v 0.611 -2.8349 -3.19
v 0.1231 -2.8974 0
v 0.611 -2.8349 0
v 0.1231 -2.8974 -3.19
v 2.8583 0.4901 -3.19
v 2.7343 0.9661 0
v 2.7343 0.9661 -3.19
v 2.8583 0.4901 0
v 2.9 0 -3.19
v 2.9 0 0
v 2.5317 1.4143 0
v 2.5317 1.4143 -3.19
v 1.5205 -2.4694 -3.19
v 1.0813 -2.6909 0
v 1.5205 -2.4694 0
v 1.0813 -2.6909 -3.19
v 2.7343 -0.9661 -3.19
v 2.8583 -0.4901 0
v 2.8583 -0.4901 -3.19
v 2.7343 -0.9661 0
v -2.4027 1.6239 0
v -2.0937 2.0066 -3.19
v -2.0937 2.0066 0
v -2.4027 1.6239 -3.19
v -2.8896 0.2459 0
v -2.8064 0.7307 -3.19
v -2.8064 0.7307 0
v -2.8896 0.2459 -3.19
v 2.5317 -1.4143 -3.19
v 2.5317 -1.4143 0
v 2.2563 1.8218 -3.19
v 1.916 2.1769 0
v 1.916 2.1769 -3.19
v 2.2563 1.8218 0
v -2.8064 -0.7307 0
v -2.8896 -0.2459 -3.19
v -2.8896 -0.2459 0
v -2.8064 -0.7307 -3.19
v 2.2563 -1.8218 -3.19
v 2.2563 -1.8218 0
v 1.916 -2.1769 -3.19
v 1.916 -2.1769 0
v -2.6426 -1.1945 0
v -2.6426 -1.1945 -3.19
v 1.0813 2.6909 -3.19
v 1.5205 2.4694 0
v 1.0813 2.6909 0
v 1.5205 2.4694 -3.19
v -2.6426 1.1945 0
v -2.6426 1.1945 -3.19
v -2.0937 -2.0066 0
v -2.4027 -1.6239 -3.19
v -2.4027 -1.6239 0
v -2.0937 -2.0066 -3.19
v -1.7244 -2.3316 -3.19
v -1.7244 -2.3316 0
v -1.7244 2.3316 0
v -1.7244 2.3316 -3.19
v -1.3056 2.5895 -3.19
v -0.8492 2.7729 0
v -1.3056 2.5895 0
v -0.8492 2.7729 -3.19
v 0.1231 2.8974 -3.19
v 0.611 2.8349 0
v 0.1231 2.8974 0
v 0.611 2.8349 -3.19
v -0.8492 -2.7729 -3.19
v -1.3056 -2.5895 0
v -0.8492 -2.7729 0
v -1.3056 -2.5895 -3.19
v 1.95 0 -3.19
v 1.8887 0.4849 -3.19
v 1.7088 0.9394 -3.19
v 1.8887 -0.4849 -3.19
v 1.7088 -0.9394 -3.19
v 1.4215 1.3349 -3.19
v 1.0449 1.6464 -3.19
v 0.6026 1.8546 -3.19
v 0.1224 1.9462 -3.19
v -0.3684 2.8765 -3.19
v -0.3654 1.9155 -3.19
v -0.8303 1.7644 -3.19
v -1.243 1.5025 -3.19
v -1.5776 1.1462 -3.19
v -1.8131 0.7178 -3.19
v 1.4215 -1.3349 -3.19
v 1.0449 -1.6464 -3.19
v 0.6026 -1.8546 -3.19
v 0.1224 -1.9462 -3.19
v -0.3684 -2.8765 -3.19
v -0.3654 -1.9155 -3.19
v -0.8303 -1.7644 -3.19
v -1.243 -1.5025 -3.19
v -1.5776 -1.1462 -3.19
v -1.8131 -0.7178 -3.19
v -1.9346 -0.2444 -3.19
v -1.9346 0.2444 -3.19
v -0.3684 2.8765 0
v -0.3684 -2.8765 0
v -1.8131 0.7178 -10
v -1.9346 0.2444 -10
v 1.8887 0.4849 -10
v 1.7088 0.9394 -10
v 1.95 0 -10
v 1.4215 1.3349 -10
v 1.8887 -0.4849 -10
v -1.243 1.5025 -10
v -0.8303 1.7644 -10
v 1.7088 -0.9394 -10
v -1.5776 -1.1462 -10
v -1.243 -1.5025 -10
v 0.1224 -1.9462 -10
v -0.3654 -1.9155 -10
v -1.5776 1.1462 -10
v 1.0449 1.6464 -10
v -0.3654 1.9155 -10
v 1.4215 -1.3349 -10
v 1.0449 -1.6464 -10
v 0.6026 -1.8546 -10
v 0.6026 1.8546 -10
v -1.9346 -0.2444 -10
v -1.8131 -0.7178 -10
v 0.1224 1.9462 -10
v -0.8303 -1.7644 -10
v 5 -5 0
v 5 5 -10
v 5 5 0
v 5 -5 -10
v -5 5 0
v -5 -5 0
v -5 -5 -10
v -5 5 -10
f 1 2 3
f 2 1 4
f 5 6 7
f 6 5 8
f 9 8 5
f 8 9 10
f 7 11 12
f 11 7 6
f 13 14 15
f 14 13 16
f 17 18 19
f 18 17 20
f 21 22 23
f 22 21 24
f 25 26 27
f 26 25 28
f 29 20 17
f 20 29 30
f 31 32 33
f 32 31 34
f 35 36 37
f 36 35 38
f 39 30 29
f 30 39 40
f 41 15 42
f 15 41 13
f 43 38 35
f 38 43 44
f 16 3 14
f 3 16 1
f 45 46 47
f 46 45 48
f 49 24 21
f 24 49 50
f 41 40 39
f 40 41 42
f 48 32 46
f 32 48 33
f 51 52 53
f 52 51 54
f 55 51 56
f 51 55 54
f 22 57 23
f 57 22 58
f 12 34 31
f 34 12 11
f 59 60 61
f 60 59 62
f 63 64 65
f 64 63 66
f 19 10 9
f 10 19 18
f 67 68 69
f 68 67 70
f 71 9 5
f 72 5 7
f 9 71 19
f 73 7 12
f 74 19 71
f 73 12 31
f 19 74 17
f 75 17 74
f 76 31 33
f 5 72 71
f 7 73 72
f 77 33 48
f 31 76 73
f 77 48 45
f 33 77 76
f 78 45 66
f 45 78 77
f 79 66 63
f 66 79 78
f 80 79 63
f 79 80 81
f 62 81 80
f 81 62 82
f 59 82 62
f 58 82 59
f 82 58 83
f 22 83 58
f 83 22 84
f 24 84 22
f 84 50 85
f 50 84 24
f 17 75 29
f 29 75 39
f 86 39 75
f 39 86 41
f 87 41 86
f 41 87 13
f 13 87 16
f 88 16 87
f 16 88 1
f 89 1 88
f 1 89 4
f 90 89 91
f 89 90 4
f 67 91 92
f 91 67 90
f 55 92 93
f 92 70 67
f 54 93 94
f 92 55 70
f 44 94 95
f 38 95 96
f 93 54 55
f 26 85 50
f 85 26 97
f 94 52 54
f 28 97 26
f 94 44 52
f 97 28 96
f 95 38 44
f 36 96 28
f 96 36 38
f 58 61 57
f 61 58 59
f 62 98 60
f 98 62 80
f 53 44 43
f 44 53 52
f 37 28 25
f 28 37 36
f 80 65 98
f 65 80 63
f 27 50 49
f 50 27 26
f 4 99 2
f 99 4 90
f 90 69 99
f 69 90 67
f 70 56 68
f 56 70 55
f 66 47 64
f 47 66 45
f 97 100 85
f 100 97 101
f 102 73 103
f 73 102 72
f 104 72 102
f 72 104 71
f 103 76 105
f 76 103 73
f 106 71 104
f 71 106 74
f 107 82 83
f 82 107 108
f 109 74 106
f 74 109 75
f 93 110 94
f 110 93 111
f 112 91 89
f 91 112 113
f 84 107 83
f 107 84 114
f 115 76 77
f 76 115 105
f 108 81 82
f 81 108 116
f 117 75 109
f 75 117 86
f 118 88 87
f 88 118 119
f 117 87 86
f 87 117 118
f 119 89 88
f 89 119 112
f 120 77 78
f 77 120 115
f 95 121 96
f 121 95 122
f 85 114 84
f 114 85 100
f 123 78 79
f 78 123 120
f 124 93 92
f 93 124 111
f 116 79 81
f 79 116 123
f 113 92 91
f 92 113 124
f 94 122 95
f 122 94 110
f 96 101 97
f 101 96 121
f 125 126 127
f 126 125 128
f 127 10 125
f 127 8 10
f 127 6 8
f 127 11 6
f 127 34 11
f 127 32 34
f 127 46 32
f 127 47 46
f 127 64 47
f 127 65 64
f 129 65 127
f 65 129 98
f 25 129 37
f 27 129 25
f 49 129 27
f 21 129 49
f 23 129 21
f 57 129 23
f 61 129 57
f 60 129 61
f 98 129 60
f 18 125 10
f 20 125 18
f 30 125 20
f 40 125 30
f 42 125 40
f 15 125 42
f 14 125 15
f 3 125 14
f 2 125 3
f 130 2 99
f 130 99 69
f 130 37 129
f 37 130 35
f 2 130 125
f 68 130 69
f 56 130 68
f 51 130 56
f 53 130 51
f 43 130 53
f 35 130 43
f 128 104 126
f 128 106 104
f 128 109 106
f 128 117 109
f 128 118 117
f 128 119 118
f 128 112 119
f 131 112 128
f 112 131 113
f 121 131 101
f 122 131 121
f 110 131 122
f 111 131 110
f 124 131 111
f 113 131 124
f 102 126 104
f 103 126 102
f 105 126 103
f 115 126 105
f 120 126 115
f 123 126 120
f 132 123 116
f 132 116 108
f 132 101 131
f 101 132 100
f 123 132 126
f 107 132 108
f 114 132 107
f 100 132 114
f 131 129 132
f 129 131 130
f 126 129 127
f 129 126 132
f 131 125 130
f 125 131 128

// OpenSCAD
// file: ../Polygon.scad
//============================================================
// OpenSCAD
// Regular Convex Polygon Library
// Last Modified : 2015/10/28
//============================================================
/*

	Definition

	N = Number of Side N >=3
	A = apothem
		radius of inside circle
	R = circumradius
		Radius of outside circle
	S = Side
		Lenght of a side

	Build polygon with the Apothem :
	N and A is known
	Need to calculate S then R
	use $fn

	Build Polygon with Circumradius
	N and R known
	use $fn

	Build Polygon with Side
	N and S Known
	Need to calculate R and optionaly A
	use $fn	

	TO DO
    Control result

	For more information :
	http://en.wikipedia.org/wiki/Regular_polygon

*/

//------------------------------------------------------------
//
//------------------------------------------------------------
Demo();

//------------------------------------------------------------
// Demo
//------------------------------------------------------------
module Demo()
{
	inch = 25.4;	// 25.4mm
	// A = apothem - it's a RADIUS !
	// For a bolt of 4 inches spécify A=2*inch
	//Polygon(N=7,A=2*inch,h=0);	// 4 inches radius Polygon
	//Polygon(N=7,A=49.8365,h=0);
	//Trigon(A=50,h=10);			// N=3
	//Dodecagon(A=50,h=0);			// N=12

    //rotate([0,0,360/7/2])
	//Nonagon(R=55.3144,h=10,debug=true);

	//Polygon(N=6,A=60,h=0,debug=false);
	//Polygon(N=6,A=60,h=5,debug=true);

    Enneagon(A=50);
}


//------------------------------------------------------------
// Polygon : 
//------------------------------------------------------------
module Polygon(N=3,A=0,R=0,S=0,h=0,debug=false)
{
	N = ( N < 3 ? 3 : N );

	angle = 360/N;
	angleA = angle/2;

	if (debug)
	{
		echo("N = ", N);
		echo("A = ", A);
		echo("S = ", S);
		echo("R = ", R);
	}

	if ( A > 0 )		// if A assign R and S
	{
        S = 2 * A * tan(angleA);							// assign
		//R = (S/2) / sin(angleA);						// no assign ???
		R = ( A * tan(angleA) ) / sin(angleA);		// asign
		_Build_Polygon(N=N,R=R,h=h);
		if (debug)
		{
			echo("aN = ", N);
			echo("aA = ", A);
			echo("aS = ", S);
			echo("aR = ", R);
			#cylinder(r=A,h=h+1,center=true,$fn=150);
			%cylinder(r=R,h=h+1,center=true,$fn=150);
		}
	}
	else
	{
		if ( S > 0 )		// if S assign R and A
		{
			R = (S/2) / sin(angleA);			// assign
			A = S / ( 2 * tan(angleA) );		// assign
            _Build_Polygon(N=N,R=R,h=h);
			if (debug)
			{
				echo("sN = ", N);
				echo("sA = ", A);
				echo("sS = ", S);
				echo("sR = ", R);
				#cylinder(r=A,h=h+1,center=true,$fn=150);
				%cylinder(r=R,h=h+1,center=true,$fn=150);
			}
		}
		else
		{
			if ( R == 0 )		// default
			{
				S = 2 * R * sin(angleA);			// no assign ???
				A = S / ( 2 * tan(angleA) );		// no assign ???
				_Build_Polygon(N=N,h=h);
				if (debug)
				{
					echo("0N = ", N);
					echo("0A = ", A);
					echo("0S = ", S);
					echo("0R = ", R);
					#cylinder(r=A,h=h+1,center=true,$fn=150);
					%cylinder(r=R,h=h+1,center=true,$fn=150);
				}
			}
			else		// build with R
			{
				S = 2 * R * sin(angleA);
				A = S / ( 2 * tan(angleA) );			// no assign ???
				//A = R * ( sin(angleA) / tan(angleA) )	// no assign ???
				_Build_Polygon(N=N,R=R,h=h);
				if (debug)
				{
					echo("rN = ", N);
					echo("rA = ", A);
					echo("rS = ", S);
					echo("rR = ", R);
					%cylinder(r=R,h=h+1,center=true,$fn=150);
				}
			}
		}
	}

	if (debug)
	{
		echo("fN = ", N);
		echo("fA = ", A);
		echo("fS = ", S);
		echo("fR = ", R);
	}
}

//------------------------------------------------------------
// Build
//------------------------------------------------------------
module _Build_Polygon(N=3,R=1,h=0)
{
	if (h > 0)
	{
		// 3D primitive h>0
		cylinder(r=R,h=h,$fn=N,center=true);
	}
	else
	{
		// 2D primitive h=0
		circle(r=R,$fn=N,center=true);
	}
}

//------------------------------------------------------------
// Building lots from N=3, N=N+1
// http://en.wikipedia.org/wiki/Polygon
//------------------------------------------------------------

// 3 sides
module Trigon(A=0,R=0,S=0,h=0,debug=false)
	{Polygon(N=3,A=A,R=R,S=S,h=h,debug=debug);}

module Triangle(A=0,R=0,S=0,h=0,debug=false)
	{Polygon(N=3,A=A,R=R,S=S,h=h,debug=debug);}

// 4 sides
module Tetragon(A=0,R=0,S=0,h=0,debug=false)
	{Polygon(N=4,A=A,R=R,S=S,h=h,debug=debug);}

module Quadrilateral(A=0,R=0,S=0,h=0,debug=false)
	{Polygon(N=4,A=A,R=R,S=S,h=h,debug=debug);}

module Quadrangle(A=0,R=0,S=0,h=0,debug=false)
	{Polygon(N=4,A=A,R=R,S=S,h=h,debug=debug);}

// 5 sides
module Pentagon(A=0,R=0,S=0,h=0,debug=false)
	{Polygon(N=5,A=A,R=R,S=S,h=h,debug=debug);}

// 6 sides
module Hexagon(A=0,R=0,S=0,h=0,debug=false)
	{Polygon(N=6,A=A,R=R,S=S,h=h,debug=debug);}

// 7 sides
module Heptagon(A=0,R=0,S=0,h=0,debug=false)
	{Polygon(N=7,A=A,R=R,S=S,h=h,debug=debug);}

// 8 sides
module Octagon(A=0,R=0,S=0,h=0,debug=false)
	{Polygon(N=8,A=A,R=R,S=S,h=h,debug=debug);}

// 9 sides
module Enneagon(A=0,R=0,S=0,h=0,debug=false)
	{Polygon(N=9,A=A,R=R,S=S,h=h,debug=debug);}

module Nonagon(A=0,R=0,S=0,h=0,debug=false)
	{Polygon(N=9,A=A,R=R,S=S,h=h,debug=debug);}

// 10 sides
module Decagon(A=0,R=0,S=0,h=0,debug=false)
	{Polygon(N=10,A=A,R=R,S=S,h=h,debug=debug);}

// 11 sides
module Handecagon(A=0,R=0,S=0,h=0,debug=false)
	{Polygon(N=11,A=A,R=R,S=S,h=h,debug=debug);}

// 12 sides
module Dodecagon(A=0,R=0,S=0,h=0,debug=false)
	{Polygon(N=12,A=A,R=R,S=S,h=h,debug=debug);}

// ...

// 100 sides
module Hectogon(A=0,R=0,S=0,h=0,debug=false)
	{Polygon(N=100,A=A,R=R,S=S,h=h,debug=debug);}

//==EOF=======================================================
// file: ../Bolt.scad
include <defaults.scad>;

module Bolt(
  l=10,
  h_head=5,
  d_head=10,
  d=5,
  tolerance=default_metric_tolerance,
  inset=1,
  extra_tolerance=default_bolt_extra_tolerance
) {
  r_head = d_head/2;
  r = d/2;

  translate([0, 0, -inset*h_head]){
    translate([0, 0, 0.01])
    cylinder(r=r_head+tolerance*2, h=h_head);

    translate([0, 0, -l+0.01])
    cylinder(r=r+tolerance*2+extra_tolerance, h=l+0.01);
  }
}
// file: ../Nut.scad
include <defaults.scad>;
use <Polygon.scad>;

module Nut(
  h=10,
  A=10,
  tolerance=default_metric_tolerance,
  inset=1
) {
  translate([0, 0, -h/2+0.01+((1-inset)*h)])
  Hexagon(
    A=A+tolerance,
    h=h+tolerance*2
  );
}
// file: ../defaults.scad
default_metric_tolerance = 0.1;
default_bolt_extra_tolerance = 0.25;
// file: ../M3.scad
include <defaults.scad>;
use <Nut.scad>;
use <Bolt.scad>;

h_nut_m3 = 2.25;
a_nut_m3 = 5.4;
A_nut_m3 = a_nut_m3 / 2;
d_head_m3 = 5.4;
h_head_m3 = 3.2;
d_m3 = 3;

module NutM3(tolerance=default_metric_tolerance, h=h_nut_m3, inset=1) {
  Nut(h=h, A=A_nut_m3, tolerance=tolerance, inset=inset);
}

module BoltM3(l=10, tolerance=default_metric_tolerance, inset=1) {
  Bolt(l=l, h_head=h_head_m3, d_head=d_head_m3, d=d_m3, tolerance=tolerance, inset=inset);
}
// main file
use <../M3.scad>;

$fs = 0.5;
$fa = 2;

w = 10;
h = 10;

difference() {
  translate([-w/2, -w/2, -h])
  cube([w, w, h]);

  BoltM3(l=15, inset=1);
}
